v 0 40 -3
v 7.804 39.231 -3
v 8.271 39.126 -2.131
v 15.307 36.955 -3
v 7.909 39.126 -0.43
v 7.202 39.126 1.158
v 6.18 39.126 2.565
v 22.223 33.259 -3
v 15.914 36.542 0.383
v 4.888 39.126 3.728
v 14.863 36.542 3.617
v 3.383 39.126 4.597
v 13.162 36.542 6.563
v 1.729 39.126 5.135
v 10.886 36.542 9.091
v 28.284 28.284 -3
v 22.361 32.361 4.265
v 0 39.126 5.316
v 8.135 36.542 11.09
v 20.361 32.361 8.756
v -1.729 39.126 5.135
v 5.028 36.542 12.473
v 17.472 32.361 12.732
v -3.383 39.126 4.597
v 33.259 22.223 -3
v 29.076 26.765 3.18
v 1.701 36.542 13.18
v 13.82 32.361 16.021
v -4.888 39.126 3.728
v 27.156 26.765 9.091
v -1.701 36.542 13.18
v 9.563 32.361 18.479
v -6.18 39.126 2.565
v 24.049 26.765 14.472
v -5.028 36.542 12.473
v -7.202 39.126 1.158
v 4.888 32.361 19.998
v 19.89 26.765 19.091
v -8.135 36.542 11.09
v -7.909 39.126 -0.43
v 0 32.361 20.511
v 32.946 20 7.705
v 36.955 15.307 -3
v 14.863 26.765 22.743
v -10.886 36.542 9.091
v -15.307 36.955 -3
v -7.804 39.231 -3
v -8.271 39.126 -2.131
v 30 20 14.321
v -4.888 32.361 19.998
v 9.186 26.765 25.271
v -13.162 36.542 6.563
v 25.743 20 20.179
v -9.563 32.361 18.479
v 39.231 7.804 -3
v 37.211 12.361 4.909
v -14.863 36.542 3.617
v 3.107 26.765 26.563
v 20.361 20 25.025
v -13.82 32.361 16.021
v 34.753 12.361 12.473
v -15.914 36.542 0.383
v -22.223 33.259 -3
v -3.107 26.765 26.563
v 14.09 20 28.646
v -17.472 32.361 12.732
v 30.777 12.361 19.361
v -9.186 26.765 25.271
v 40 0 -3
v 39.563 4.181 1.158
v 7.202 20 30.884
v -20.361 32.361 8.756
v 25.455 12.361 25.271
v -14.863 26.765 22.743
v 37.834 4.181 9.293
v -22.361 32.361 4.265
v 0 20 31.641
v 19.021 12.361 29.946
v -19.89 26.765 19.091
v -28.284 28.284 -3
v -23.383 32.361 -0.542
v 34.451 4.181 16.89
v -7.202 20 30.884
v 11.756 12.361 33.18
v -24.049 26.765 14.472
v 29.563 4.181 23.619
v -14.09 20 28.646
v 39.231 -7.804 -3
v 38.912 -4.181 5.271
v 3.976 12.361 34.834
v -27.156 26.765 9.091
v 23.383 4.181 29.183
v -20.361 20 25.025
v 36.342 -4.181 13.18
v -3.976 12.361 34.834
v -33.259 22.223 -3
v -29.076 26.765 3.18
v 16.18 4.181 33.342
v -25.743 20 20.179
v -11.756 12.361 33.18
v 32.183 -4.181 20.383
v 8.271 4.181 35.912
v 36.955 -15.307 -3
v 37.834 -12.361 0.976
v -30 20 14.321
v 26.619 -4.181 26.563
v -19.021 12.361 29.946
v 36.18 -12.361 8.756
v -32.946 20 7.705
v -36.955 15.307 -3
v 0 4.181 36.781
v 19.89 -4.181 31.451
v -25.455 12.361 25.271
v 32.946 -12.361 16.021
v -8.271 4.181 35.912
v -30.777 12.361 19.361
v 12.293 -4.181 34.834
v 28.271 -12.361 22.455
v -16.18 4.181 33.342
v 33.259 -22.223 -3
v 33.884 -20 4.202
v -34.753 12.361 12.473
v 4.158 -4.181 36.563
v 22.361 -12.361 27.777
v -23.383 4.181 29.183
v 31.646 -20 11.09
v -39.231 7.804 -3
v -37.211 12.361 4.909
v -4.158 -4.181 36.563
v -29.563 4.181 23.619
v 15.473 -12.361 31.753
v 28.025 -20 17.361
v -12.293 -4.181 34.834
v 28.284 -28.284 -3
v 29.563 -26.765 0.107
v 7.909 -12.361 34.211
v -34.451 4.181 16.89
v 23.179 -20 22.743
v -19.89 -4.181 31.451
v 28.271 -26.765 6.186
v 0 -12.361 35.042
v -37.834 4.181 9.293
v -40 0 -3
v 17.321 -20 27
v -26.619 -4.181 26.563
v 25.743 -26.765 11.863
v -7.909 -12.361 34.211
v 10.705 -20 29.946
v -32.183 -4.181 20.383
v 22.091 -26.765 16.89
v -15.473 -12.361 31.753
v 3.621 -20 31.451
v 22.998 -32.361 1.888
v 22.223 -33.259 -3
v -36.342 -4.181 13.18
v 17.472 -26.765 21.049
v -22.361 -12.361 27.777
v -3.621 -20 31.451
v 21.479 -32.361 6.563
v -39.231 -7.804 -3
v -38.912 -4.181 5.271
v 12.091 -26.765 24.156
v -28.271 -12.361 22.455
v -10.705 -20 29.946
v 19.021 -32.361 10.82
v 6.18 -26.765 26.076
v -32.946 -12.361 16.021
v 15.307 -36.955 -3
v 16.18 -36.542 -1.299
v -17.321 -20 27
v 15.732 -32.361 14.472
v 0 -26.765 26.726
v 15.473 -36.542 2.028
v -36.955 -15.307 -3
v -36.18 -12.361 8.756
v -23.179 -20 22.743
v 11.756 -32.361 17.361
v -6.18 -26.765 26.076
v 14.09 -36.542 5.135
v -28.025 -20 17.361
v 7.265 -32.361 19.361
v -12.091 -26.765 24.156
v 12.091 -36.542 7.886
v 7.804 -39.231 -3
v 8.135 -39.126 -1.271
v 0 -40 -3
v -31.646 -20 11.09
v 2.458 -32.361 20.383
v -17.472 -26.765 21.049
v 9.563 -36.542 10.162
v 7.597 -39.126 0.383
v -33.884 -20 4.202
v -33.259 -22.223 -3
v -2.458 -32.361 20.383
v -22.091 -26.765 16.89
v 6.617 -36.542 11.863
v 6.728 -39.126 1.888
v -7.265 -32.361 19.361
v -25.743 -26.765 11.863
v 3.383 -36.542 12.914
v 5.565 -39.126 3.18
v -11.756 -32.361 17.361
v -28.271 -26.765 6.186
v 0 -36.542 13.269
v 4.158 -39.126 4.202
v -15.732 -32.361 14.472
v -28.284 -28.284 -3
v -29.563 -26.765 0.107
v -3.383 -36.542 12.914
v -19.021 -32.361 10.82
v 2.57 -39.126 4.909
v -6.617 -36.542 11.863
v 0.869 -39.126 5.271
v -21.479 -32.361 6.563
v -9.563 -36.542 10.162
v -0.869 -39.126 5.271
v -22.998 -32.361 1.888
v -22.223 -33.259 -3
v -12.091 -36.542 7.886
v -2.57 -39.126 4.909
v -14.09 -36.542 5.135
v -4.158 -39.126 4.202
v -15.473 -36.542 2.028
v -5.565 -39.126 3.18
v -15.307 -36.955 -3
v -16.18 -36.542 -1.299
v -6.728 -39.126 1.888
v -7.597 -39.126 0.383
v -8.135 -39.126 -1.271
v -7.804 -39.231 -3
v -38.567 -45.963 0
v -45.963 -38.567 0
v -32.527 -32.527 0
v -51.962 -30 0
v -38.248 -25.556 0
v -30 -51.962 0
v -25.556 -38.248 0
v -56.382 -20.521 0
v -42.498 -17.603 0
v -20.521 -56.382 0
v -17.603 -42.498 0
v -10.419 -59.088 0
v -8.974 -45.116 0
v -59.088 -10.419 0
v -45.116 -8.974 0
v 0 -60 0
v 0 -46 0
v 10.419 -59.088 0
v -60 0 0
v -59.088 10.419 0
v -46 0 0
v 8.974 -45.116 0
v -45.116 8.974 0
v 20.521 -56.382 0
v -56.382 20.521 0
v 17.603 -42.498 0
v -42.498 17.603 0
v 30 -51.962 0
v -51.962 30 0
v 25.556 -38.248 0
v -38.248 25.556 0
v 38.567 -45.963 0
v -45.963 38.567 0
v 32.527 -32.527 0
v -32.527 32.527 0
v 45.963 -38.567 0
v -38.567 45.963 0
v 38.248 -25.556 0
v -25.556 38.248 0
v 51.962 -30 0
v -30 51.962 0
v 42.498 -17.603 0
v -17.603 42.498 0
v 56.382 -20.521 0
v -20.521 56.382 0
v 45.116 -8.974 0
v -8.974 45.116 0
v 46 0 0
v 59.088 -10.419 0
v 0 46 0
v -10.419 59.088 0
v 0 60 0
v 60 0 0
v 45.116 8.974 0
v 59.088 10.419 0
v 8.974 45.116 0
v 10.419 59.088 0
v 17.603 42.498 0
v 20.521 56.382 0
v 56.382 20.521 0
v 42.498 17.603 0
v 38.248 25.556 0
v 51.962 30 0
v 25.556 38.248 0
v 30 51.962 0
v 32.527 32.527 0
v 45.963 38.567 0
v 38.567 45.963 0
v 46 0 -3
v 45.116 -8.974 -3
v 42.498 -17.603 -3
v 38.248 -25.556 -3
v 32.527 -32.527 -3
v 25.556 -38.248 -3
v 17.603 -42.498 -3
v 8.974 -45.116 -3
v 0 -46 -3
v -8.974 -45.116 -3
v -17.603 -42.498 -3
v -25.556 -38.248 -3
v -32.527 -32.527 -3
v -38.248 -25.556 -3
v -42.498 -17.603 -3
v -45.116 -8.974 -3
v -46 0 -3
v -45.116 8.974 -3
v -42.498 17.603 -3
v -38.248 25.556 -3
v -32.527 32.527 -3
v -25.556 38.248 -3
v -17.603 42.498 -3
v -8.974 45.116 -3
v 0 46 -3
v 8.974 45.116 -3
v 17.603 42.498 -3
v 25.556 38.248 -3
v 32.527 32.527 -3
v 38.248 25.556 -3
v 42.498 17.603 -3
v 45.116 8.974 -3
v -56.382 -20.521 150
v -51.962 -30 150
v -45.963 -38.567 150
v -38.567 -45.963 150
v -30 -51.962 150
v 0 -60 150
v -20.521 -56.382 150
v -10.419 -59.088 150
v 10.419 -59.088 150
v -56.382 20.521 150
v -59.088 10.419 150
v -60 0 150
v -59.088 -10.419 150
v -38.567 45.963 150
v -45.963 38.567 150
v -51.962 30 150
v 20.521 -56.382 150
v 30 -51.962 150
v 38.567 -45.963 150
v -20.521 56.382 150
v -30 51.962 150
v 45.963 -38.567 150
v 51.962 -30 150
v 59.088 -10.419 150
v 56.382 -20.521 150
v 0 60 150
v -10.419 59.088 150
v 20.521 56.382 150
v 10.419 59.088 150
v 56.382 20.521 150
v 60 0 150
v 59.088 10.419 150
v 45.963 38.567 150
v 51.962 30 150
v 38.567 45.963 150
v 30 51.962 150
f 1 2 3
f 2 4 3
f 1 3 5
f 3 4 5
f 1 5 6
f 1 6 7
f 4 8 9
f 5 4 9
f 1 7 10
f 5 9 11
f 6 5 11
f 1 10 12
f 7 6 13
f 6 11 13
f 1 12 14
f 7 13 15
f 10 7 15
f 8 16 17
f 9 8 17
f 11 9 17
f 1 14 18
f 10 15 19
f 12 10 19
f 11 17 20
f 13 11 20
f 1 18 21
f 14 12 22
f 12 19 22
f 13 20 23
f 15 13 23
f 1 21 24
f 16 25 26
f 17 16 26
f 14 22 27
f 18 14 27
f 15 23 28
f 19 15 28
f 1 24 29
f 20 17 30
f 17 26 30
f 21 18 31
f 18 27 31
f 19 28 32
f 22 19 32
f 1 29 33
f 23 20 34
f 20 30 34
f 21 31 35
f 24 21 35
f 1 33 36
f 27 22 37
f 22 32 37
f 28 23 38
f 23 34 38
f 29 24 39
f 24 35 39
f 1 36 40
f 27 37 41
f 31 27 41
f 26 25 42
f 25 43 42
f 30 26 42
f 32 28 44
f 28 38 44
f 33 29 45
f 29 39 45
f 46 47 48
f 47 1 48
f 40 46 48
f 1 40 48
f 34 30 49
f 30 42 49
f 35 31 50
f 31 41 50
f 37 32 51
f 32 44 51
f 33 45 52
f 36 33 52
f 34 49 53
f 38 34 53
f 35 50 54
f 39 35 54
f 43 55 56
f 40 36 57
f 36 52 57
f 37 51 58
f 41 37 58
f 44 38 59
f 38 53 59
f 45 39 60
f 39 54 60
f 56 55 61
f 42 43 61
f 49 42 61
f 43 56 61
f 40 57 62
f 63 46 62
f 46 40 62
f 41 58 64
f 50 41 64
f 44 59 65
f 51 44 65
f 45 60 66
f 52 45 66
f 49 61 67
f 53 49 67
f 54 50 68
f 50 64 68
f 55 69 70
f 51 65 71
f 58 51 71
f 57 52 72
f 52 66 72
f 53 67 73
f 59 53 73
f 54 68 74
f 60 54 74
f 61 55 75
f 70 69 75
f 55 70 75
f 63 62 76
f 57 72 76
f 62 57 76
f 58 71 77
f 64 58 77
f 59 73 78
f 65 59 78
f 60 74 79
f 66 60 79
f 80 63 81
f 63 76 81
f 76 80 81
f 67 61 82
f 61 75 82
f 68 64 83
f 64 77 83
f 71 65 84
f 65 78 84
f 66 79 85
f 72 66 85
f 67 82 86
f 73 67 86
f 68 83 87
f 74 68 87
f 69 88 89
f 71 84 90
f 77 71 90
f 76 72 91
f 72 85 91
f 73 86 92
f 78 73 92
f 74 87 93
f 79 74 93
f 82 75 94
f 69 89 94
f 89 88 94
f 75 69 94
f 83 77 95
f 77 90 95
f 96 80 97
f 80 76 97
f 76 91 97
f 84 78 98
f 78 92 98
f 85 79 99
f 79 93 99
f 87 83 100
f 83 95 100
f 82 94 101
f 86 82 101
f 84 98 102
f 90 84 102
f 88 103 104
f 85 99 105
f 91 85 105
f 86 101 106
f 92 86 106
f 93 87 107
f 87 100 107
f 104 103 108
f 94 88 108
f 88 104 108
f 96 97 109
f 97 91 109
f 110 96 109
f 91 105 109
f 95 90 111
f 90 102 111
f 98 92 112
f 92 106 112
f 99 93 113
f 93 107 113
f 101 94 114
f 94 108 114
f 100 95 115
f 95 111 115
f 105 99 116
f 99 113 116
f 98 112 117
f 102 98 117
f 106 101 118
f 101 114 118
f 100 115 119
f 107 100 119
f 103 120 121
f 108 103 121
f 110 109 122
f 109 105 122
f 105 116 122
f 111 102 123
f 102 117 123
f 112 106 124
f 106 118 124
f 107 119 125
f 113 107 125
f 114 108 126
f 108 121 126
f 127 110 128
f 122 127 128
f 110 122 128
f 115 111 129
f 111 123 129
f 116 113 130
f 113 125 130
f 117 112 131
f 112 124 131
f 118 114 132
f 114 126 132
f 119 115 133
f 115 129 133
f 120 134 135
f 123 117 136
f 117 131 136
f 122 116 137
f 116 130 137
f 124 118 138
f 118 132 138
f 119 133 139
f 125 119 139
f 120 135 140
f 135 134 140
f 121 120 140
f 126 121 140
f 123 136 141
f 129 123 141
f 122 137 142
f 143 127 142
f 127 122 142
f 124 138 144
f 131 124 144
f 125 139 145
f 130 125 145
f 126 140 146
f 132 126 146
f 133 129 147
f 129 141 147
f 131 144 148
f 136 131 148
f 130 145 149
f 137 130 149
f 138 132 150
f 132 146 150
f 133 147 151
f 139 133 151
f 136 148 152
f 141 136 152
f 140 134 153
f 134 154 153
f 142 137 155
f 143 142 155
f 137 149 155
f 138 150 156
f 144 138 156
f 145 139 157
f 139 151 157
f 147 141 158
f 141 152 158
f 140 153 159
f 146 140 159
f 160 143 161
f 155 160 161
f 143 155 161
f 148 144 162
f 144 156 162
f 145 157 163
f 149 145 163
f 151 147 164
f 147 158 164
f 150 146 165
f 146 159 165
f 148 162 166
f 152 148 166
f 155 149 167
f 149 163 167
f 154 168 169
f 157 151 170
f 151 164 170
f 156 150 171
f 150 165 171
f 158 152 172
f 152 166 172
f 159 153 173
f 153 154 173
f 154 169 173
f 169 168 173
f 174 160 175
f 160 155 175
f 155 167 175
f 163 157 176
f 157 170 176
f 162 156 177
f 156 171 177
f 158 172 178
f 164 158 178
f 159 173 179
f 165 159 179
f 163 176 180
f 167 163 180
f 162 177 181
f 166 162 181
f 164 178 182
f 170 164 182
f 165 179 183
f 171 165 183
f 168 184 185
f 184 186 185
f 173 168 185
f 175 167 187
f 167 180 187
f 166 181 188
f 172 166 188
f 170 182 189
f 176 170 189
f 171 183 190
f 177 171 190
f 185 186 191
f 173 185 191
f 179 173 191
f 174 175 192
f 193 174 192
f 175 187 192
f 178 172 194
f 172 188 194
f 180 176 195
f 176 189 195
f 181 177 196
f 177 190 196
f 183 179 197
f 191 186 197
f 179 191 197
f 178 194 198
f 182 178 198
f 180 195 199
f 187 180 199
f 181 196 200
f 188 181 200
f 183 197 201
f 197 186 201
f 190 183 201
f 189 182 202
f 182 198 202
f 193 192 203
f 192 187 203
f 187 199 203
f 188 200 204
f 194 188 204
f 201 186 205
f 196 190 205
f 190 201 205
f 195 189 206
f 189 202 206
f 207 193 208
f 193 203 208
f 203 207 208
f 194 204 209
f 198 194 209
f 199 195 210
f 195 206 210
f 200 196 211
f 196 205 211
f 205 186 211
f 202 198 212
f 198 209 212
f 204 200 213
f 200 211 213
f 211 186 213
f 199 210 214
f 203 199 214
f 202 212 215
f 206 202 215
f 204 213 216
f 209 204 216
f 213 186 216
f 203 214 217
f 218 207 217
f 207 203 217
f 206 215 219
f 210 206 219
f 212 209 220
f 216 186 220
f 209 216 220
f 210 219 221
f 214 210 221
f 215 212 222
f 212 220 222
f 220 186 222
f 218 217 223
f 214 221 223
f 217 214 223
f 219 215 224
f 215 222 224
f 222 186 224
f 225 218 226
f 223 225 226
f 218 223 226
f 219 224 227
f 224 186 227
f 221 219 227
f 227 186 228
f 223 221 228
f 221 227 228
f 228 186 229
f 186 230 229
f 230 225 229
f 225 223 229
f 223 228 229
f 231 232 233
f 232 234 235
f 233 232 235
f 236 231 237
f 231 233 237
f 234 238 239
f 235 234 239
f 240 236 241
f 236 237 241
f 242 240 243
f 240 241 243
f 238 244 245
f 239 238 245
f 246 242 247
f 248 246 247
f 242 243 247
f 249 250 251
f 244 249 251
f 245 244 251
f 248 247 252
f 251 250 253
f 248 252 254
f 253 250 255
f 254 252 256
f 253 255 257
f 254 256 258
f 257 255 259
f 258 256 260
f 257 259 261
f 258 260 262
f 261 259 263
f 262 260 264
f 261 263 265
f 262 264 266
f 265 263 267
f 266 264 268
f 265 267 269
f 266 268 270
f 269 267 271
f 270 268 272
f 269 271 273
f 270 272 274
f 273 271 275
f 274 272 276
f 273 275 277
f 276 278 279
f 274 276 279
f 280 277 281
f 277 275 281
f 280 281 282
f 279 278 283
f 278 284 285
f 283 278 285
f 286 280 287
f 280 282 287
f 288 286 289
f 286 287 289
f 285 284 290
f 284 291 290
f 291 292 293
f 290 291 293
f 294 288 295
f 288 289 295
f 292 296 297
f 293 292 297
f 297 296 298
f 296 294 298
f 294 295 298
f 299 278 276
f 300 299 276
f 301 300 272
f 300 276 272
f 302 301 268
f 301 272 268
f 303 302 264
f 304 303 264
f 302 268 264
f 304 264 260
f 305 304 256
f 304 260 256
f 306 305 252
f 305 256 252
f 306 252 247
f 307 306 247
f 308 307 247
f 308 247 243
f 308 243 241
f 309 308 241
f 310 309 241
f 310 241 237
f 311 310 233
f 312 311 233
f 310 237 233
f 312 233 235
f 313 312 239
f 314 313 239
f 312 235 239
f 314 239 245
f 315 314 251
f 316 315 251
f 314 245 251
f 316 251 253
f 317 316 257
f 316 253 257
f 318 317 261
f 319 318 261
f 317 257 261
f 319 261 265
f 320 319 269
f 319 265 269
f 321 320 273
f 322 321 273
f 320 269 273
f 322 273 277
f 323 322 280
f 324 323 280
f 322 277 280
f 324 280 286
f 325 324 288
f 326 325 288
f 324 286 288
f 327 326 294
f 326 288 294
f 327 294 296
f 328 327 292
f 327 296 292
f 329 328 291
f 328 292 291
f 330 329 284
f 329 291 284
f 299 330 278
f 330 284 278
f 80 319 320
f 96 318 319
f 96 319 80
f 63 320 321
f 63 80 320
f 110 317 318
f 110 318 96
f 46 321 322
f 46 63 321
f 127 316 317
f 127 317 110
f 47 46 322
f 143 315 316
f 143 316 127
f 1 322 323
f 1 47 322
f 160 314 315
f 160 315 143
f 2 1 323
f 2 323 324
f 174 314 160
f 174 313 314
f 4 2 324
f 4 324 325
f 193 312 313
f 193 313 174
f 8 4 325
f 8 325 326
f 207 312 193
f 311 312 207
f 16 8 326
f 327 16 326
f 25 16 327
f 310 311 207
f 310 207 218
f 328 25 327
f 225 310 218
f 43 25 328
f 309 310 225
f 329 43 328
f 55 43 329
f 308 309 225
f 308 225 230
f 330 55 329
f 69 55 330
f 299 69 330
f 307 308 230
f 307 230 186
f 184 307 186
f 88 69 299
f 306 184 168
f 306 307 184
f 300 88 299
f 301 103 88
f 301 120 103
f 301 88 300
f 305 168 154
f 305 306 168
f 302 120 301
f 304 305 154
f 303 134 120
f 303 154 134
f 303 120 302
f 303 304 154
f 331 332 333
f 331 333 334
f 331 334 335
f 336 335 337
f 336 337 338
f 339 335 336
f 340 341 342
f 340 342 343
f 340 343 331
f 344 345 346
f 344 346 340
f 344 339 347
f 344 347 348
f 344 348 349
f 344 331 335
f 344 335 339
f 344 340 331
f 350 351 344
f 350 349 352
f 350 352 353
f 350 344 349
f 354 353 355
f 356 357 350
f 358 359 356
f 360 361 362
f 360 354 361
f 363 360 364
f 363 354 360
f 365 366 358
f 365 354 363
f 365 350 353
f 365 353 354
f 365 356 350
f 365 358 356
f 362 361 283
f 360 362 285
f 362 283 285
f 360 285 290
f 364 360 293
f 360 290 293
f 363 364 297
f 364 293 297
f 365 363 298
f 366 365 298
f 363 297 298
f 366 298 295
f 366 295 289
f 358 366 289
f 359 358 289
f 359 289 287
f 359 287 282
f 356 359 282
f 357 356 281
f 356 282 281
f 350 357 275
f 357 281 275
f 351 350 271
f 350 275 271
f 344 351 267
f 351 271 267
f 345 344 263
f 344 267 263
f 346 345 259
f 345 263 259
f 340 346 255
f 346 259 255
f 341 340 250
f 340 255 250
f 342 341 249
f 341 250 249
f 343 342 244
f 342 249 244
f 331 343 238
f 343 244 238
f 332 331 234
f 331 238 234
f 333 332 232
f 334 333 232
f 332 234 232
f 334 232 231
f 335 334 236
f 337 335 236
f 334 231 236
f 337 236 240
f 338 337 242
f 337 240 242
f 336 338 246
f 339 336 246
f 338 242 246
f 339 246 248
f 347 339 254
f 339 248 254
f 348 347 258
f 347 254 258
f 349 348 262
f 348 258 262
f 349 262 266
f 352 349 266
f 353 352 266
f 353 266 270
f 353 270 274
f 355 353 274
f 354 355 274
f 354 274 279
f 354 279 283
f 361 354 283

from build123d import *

# Parameters (mm, degrees)
F0_R     = 60
F1_DEPTH = 150
F2_R     = 46
F3_DEPTH = 3


# Not quite as in the source:
# - a feature names something its author has since deleted; it is built from what else it names


with BuildPart() as f1:
    # F0 (on Top) → F1 (new body)
    with BuildSketch(Plane.XY):
        Circle(F0_R)
    extrude(amount=F1_DEPTH)

    # F2 (on face) → F3 (join)
    with BuildSketch(Plane(origin=(0, 0, 0), x_dir=(1, 0, 0), z_dir=(0, 0, -1))):
        Circle(F2_R)
    extrude(amount=F3_DEPTH)

    # F4 (on face) → F5 (revolve, cut)
    with BuildSketch(Plane(origin=(0, 0, -3), x_dir=(1, 0, 0), z_dir=(0, 0, -1))):
        with BuildLine():
            Line((0, 40), (0, -40))
            ThreePointArc((0, -40), (40, 0), (0, 40))
        make_face()
    revolve(axis=Axis((0, 0, -3), (0, -1, 0)), mode=Mode.SUBTRACT)


solid = f1.part
